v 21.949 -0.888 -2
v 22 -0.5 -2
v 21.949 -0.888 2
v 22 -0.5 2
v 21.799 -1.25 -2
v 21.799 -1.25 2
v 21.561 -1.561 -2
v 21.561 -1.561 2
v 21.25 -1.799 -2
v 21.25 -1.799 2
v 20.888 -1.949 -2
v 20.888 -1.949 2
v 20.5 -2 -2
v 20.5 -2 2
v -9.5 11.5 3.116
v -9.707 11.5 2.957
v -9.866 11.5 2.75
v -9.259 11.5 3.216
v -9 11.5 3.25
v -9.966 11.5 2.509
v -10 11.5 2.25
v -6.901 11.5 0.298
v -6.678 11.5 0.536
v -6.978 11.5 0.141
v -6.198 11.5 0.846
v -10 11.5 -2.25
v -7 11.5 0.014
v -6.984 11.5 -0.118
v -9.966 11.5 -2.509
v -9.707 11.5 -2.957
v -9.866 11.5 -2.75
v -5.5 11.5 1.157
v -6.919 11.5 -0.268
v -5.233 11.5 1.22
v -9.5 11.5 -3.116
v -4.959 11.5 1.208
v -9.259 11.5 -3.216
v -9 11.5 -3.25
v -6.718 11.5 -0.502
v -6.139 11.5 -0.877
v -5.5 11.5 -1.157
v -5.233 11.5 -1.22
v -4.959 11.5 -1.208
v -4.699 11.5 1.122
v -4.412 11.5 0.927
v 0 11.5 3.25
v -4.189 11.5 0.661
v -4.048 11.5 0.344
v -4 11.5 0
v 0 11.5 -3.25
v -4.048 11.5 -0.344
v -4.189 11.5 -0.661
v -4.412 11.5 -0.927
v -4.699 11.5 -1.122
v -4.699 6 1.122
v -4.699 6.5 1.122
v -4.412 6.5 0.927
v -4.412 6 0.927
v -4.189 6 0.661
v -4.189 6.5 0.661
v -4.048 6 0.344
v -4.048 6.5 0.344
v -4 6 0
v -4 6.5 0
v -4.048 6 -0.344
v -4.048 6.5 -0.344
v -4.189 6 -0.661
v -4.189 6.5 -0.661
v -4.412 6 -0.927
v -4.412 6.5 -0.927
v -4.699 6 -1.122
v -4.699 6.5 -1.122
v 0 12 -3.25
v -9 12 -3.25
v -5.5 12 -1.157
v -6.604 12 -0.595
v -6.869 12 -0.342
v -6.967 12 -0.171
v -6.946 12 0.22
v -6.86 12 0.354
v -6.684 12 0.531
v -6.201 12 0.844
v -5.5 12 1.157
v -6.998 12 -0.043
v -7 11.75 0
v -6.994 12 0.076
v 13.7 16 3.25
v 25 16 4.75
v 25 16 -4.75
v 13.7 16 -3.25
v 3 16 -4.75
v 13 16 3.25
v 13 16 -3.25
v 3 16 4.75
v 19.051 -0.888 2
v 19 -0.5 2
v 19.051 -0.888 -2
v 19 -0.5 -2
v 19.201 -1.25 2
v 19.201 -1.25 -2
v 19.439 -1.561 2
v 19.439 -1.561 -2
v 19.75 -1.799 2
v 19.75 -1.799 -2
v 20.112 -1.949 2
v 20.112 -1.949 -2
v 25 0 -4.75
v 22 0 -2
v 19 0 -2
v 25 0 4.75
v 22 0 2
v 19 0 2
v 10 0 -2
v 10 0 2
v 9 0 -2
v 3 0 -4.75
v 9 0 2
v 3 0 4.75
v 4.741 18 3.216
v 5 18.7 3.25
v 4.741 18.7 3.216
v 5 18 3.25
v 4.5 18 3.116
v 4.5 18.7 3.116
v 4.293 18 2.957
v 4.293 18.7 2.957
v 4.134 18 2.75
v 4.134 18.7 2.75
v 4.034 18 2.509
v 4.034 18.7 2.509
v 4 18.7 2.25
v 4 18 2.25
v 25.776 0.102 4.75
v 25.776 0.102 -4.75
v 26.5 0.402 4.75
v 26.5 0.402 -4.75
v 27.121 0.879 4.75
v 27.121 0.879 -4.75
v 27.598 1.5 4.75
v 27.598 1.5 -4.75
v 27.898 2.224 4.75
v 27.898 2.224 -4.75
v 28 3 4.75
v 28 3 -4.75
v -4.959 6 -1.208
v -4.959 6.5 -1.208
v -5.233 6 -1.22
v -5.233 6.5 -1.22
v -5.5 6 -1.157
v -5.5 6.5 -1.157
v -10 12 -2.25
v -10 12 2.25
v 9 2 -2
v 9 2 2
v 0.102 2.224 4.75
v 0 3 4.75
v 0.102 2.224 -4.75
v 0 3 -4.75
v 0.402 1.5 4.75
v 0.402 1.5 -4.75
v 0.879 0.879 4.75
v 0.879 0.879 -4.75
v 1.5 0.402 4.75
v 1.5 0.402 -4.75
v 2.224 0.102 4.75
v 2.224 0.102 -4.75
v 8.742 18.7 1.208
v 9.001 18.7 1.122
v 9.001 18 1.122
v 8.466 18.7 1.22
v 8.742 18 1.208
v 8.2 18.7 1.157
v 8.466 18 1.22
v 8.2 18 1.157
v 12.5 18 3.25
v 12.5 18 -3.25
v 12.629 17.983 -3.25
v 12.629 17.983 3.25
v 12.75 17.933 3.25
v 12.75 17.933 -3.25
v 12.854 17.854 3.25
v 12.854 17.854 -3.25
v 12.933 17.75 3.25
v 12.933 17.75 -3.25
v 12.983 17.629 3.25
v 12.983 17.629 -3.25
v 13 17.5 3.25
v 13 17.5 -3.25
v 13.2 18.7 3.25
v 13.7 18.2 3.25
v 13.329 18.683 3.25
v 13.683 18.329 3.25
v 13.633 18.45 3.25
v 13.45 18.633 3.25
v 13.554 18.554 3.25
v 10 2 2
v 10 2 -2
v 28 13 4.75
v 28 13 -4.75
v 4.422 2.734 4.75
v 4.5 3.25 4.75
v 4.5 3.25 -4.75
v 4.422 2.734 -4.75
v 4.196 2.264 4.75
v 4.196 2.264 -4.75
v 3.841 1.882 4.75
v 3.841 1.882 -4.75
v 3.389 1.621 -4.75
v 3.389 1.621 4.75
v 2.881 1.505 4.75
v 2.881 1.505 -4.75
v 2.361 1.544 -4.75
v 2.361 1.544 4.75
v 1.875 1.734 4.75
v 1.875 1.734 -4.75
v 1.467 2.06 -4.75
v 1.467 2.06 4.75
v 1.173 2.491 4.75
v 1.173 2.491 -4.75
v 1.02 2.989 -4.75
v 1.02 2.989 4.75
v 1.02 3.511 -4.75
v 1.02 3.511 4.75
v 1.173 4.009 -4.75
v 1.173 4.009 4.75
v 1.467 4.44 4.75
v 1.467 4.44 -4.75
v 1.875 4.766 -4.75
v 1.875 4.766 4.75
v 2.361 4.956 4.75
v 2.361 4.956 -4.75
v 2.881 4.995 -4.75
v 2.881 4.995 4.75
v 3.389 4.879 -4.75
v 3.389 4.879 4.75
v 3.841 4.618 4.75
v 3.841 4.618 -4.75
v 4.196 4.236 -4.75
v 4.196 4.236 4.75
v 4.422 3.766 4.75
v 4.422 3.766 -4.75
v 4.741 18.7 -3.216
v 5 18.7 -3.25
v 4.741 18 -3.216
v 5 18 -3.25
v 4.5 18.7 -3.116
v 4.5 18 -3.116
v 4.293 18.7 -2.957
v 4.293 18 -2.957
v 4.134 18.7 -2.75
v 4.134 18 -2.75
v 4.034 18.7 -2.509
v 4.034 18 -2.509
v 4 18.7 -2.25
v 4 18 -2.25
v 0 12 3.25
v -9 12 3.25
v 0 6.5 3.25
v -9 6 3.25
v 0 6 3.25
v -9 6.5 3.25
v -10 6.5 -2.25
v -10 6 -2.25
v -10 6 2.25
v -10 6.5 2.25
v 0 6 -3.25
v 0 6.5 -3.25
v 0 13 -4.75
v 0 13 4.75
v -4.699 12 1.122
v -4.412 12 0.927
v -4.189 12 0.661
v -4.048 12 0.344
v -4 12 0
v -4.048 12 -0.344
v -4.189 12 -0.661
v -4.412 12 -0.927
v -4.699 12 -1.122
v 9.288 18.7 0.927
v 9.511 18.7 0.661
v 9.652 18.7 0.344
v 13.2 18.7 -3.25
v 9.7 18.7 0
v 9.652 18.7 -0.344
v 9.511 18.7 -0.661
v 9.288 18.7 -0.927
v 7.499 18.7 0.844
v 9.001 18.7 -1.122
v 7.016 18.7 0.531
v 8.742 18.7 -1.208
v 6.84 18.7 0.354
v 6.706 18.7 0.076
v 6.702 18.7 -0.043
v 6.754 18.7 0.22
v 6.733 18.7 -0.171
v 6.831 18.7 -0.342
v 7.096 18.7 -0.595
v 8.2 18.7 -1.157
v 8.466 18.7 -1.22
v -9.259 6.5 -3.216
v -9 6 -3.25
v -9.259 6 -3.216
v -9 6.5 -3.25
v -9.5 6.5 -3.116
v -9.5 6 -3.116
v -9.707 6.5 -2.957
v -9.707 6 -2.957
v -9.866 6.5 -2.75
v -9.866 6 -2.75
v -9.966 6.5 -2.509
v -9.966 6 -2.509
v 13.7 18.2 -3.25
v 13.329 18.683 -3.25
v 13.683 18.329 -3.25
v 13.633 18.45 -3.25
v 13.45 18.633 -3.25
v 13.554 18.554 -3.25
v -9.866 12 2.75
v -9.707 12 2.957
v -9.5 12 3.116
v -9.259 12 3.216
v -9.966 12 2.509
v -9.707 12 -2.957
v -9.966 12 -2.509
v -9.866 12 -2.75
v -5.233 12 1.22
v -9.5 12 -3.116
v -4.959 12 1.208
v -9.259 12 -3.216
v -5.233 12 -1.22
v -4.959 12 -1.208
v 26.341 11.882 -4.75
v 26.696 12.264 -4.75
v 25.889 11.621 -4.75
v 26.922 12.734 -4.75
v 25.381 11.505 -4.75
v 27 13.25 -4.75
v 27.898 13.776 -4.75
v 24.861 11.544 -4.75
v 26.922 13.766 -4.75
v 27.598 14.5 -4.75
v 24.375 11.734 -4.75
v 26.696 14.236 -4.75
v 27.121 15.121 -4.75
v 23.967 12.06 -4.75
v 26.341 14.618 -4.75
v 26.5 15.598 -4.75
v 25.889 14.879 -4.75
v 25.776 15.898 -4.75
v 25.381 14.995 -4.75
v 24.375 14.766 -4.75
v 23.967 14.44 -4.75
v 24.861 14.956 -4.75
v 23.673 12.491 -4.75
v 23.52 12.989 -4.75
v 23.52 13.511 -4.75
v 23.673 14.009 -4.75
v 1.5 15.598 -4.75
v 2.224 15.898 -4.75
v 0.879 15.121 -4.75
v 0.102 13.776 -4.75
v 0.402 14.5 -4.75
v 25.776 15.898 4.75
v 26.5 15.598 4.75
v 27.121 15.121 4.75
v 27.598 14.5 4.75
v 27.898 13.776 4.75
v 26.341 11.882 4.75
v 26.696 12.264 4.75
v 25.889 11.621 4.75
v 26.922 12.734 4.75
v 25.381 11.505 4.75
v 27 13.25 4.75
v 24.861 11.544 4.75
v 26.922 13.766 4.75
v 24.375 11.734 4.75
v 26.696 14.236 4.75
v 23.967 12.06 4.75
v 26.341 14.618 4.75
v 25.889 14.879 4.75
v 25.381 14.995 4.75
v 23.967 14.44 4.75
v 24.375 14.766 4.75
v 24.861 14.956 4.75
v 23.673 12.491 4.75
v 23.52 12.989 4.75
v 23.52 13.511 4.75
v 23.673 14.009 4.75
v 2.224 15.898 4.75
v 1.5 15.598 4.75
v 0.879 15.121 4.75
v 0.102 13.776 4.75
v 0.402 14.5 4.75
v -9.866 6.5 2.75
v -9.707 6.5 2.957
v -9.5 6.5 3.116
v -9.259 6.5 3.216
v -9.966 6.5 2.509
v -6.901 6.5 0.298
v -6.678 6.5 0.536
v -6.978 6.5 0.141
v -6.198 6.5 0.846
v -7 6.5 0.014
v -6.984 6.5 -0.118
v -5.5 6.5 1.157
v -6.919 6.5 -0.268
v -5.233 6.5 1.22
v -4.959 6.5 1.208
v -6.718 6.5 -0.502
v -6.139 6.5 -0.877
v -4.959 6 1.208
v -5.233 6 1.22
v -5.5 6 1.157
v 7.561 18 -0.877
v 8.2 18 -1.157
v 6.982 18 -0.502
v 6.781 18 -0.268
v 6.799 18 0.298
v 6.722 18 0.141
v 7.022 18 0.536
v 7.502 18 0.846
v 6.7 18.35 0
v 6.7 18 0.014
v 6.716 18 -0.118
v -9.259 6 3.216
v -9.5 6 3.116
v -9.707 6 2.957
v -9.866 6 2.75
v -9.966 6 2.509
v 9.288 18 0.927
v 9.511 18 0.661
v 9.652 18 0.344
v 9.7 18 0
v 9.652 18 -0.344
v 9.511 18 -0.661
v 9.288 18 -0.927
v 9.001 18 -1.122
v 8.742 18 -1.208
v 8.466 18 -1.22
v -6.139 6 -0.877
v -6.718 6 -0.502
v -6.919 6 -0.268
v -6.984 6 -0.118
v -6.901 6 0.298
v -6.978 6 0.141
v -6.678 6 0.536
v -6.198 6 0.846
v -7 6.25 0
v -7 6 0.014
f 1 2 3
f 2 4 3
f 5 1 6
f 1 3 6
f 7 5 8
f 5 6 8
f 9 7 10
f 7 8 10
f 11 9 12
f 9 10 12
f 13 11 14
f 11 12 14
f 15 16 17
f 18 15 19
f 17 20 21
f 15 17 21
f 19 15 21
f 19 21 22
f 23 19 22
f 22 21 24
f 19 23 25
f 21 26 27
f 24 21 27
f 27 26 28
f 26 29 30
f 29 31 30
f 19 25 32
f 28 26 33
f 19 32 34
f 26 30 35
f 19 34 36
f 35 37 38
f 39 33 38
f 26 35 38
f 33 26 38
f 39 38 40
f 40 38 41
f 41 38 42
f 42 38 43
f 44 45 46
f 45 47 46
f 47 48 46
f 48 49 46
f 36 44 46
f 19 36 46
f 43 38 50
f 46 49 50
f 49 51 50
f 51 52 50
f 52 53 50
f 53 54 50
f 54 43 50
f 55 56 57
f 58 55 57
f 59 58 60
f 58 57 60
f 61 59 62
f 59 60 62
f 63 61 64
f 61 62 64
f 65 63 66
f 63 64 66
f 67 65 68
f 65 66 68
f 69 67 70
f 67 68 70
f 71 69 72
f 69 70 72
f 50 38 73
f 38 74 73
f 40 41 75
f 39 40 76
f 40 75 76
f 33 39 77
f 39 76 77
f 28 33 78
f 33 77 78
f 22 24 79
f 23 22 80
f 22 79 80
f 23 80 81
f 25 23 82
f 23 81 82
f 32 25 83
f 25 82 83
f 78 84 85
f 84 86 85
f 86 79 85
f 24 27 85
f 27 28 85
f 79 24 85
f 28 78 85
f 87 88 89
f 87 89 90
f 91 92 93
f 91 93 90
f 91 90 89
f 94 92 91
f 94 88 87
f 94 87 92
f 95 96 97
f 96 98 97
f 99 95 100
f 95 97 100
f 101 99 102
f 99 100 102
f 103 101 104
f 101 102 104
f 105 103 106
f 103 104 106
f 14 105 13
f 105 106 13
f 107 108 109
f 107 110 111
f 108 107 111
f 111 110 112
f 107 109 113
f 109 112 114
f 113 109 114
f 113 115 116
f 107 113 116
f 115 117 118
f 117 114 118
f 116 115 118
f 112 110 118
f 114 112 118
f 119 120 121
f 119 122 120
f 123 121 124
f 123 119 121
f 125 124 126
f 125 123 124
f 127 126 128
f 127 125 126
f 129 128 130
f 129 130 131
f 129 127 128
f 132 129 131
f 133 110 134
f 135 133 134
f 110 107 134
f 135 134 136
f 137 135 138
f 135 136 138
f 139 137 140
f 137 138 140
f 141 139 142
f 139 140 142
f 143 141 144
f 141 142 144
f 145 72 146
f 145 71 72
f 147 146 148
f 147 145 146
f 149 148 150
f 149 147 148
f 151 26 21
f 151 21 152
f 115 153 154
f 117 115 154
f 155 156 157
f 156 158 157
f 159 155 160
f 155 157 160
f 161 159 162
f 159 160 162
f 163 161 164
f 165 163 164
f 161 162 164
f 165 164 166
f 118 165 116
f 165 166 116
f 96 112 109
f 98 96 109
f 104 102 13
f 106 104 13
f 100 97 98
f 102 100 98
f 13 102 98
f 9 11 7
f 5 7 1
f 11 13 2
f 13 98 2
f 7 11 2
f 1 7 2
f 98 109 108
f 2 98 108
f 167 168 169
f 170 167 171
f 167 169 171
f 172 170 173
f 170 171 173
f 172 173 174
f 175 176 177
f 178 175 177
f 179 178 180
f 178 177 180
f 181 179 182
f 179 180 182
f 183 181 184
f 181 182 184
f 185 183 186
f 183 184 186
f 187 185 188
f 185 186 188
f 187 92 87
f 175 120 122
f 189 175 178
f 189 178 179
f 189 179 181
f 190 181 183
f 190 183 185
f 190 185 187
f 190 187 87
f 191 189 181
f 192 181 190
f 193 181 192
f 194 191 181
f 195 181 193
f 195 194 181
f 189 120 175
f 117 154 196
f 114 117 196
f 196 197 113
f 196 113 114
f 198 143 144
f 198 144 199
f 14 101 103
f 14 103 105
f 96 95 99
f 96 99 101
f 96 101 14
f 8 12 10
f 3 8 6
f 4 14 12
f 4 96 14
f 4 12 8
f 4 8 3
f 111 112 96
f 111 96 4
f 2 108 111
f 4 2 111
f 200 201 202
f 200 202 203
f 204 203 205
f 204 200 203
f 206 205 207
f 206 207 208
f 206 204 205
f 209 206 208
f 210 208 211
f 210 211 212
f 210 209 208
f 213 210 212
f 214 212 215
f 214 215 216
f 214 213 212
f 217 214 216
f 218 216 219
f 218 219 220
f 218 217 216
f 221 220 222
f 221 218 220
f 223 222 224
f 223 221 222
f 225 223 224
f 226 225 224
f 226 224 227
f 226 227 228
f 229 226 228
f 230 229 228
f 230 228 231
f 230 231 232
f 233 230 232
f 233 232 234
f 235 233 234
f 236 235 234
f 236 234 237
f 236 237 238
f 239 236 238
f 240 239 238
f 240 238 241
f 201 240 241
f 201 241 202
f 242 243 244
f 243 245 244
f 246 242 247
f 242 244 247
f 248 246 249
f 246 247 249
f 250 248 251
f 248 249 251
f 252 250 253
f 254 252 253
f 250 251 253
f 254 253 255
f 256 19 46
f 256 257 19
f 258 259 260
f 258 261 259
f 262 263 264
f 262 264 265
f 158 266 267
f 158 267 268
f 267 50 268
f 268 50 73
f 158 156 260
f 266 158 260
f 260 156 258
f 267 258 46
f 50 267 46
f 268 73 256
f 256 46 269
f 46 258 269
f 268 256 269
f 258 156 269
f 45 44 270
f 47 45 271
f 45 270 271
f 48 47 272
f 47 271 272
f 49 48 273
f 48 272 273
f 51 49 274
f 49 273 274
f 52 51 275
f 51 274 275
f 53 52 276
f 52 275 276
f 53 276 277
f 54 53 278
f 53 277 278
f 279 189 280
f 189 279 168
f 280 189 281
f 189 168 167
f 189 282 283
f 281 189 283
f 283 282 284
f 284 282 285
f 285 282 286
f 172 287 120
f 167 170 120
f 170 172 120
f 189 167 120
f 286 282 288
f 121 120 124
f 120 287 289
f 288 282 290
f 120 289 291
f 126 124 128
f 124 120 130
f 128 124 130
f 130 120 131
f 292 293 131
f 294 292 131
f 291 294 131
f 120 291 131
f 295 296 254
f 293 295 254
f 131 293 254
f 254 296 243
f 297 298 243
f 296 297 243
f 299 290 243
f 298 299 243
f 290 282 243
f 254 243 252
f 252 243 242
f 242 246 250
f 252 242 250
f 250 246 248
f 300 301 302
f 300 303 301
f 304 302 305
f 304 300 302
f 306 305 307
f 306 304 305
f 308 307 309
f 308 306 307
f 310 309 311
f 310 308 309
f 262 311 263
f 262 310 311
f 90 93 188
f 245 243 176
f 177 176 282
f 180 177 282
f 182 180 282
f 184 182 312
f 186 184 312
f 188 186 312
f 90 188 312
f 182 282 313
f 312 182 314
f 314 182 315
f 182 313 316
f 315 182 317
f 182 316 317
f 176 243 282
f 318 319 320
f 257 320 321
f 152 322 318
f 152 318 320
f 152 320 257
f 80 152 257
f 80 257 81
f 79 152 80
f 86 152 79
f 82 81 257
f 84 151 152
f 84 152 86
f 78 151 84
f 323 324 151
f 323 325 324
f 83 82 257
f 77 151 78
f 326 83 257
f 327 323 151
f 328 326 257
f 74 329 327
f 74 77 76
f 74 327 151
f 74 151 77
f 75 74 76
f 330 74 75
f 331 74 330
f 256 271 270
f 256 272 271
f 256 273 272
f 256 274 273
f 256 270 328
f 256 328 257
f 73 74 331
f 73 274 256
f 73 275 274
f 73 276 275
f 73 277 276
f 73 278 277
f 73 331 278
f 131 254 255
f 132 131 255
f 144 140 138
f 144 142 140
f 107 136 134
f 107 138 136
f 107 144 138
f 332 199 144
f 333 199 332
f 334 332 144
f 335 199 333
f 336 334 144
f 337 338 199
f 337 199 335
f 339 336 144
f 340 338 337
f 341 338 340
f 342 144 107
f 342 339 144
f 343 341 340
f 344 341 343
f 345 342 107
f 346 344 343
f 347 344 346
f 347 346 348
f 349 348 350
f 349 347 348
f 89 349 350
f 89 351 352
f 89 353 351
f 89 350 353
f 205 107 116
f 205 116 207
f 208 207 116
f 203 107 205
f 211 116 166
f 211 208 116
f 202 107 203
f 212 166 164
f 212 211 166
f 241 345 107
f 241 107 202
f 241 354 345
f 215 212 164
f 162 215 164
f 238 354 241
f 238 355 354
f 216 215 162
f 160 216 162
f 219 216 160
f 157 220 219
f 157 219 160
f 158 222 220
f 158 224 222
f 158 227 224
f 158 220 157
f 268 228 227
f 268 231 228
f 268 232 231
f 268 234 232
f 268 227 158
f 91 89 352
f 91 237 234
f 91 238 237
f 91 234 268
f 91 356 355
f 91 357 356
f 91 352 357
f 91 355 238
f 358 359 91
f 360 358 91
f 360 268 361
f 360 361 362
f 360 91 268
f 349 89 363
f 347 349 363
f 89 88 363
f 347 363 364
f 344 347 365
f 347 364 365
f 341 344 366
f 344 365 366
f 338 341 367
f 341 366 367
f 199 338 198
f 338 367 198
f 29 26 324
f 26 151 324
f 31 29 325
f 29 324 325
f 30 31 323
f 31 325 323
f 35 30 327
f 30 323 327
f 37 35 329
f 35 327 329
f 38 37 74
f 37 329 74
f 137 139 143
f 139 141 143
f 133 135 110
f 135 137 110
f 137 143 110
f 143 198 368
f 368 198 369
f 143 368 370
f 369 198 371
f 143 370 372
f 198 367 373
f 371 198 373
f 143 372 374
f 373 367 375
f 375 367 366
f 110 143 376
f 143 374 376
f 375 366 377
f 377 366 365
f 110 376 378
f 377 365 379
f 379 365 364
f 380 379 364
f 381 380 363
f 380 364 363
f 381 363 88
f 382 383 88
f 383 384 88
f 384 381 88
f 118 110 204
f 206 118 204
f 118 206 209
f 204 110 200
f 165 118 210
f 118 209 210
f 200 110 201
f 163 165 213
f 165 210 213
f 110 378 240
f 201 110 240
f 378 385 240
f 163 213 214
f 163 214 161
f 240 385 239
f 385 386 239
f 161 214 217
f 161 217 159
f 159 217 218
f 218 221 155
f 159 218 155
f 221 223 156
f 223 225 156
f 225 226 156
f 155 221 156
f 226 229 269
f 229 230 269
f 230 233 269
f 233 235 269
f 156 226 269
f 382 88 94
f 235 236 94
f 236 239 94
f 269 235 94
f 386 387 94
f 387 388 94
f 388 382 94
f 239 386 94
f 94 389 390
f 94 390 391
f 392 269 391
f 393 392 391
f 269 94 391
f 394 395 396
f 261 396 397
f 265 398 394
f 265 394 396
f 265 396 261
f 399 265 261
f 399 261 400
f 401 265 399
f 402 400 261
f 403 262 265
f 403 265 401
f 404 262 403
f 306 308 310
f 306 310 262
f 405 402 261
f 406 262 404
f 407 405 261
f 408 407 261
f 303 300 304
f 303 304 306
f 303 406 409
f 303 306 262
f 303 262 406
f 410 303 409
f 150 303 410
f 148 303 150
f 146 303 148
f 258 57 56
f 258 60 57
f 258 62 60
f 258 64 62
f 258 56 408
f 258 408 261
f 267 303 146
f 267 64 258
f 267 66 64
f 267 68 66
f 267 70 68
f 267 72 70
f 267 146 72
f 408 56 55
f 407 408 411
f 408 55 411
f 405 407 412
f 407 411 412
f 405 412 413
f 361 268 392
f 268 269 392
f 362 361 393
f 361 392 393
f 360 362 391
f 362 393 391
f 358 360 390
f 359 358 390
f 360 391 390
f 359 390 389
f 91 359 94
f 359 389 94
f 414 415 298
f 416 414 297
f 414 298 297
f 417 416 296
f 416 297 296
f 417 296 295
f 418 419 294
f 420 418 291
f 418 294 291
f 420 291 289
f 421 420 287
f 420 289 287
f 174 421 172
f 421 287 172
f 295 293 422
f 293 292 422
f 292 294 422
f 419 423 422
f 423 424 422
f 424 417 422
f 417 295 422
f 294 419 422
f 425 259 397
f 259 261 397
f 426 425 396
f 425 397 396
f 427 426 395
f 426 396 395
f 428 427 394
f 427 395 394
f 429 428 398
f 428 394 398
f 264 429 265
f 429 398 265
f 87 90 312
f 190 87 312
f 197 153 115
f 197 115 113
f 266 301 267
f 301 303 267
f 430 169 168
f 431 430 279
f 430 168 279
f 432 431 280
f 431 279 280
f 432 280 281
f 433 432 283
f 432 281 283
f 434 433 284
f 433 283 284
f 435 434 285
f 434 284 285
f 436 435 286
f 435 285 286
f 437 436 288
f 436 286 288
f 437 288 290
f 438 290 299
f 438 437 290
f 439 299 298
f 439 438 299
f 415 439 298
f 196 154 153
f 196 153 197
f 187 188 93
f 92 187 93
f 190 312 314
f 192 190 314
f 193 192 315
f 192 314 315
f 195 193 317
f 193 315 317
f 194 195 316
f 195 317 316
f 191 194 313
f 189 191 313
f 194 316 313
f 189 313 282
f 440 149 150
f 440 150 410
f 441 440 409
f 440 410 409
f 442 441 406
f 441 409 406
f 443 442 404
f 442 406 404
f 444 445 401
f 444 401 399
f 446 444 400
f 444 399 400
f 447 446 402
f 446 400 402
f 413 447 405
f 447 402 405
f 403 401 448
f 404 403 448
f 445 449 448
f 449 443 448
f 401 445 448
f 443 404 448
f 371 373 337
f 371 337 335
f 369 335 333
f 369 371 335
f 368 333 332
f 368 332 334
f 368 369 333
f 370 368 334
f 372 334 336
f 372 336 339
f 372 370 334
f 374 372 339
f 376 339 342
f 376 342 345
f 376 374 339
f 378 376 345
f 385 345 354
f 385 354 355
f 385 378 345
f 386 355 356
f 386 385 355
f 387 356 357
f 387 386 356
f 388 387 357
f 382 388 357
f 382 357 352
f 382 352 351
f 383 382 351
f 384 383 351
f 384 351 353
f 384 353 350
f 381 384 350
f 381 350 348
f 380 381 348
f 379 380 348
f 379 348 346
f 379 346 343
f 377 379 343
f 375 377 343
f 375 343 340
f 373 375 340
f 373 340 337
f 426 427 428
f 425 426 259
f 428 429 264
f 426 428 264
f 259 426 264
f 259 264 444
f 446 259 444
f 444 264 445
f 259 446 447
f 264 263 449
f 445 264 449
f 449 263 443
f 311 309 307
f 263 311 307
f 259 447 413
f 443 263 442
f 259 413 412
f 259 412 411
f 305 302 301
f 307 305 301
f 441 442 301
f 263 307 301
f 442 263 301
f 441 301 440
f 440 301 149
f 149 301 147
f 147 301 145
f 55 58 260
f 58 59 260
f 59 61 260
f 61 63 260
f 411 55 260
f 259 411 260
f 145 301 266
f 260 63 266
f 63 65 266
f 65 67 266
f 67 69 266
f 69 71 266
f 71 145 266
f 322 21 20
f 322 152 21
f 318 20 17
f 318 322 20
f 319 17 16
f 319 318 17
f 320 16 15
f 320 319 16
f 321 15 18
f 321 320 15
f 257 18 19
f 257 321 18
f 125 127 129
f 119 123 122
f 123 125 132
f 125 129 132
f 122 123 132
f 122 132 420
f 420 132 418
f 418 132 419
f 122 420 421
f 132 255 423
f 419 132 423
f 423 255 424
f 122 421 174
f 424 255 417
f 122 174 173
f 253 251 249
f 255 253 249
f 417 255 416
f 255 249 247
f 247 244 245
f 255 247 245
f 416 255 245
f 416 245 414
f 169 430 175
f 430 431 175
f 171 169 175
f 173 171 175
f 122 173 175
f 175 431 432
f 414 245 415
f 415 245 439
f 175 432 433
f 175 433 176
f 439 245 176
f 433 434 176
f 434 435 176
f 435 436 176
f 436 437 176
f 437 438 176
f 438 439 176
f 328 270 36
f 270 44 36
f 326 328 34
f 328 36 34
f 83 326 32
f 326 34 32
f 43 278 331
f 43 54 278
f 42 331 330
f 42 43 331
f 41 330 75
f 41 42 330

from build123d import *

# Parameters (mm, degrees)
BOSS_EXTRUDE1_DEPTH      = 3.25
BOSS_EXTRUDE1_DEPTH_BACK = 3.25
SKETCH1_W                = 10
SKETCH1_H                = 0.5
SKETCH1_W_2              = 28
SKETCH1_H_2              = 16
SKETCH1_R                = 1.75
BOSS_EXTRUDE2_DEPTH      = 1.5
BOSS_EXTRUDE2_DEPTH_BACK = 8
SKETCH2_W                = 28
SKETCH2_H                = 16
SKETCH2_R                = 1.75
CUT_EXTRUDE1_DEPTH       = 9.5
CUT_EXTRUDE2_DEPTH       = 1.5
FILLET1_R                = 1
FILLET2_R                = 1
FILLET3_R                = 3
SKETCH5_W                = 3
SKETCH5_H                = 2
BOSS_EXTRUDE3_DEPTH      = 2
FILLET4_R                = 1.5
CUT_EXTRUDE3_DEPTH       = 35.003713088
CUT_EXTRUDE3_DEPTH_BACK  = 2
SKETCH6_W                = 1
SKETCH6_H                = 4


with BuildPart() as part:
    # Sketch1 → Boss-Extrude1 (new, two sides: drawn at the far end of the back side and taken through both)
    # profile 1 of 4: a face of its own
    with BuildSketch(Plane.XY.offset(-BOSS_EXTRUDE1_DEPTH_BACK)):
        with Locations((-5, 6.25)):
            Rectangle(SKETCH1_W, SKETCH1_H)
    # profile 2 of 4: a face of its own
    with BuildSketch(Plane.XY.offset(-BOSS_EXTRUDE1_DEPTH_BACK)):
        with Locations((-5, 11.75)):
            Rectangle(SKETCH1_W, SKETCH1_H)
    # profile 3 of 4: a face of its own
    with BuildSketch(Plane.XY.offset(-BOSS_EXTRUDE1_DEPTH_BACK)):
        with Locations((14, 8)):
            Rectangle(SKETCH1_W_2, SKETCH1_H_2)
        with Locations((2.75, 3.25)):
            Circle(SKETCH1_R, mode=Mode.SUBTRACT)
        with Locations((25.25, 13.25)):
            Circle(SKETCH1_R, mode=Mode.SUBTRACT)
    # profile 4 of 4: a face of its own
    with BuildSketch(Plane.XY.offset(-BOSS_EXTRUDE1_DEPTH_BACK)):
        with BuildLine():
            Line((13, 16), (13.7, 16))
            Line((13.7, 16), (13.7, 18.2))
            ThreePointArc((13.7, 18.2), (13.553553391, 18.553553391), (13.2, 18.7))
            Line((13.2, 18.7), (4, 18.7))
            Line((4, 18.7), (4, 18))
            Line((4, 18), (12.5, 18))
            ThreePointArc((12.5, 18), (12.853553391, 17.853553391), (13, 17.5))
            Line((13, 17.5), (13, 16))
        make_face()
    extrude(amount=BOSS_EXTRUDE1_DEPTH + BOSS_EXTRUDE1_DEPTH_BACK)

    # Sketch2 → Boss-Extrude2 (add, two sides: drawn at the far end of the back side and taken through both)
    with BuildSketch(Plane(origin=(0, 0, -3.25), x_dir=(-1, 0, 0), z_dir=(0, 0, -1)).offset(-BOSS_EXTRUDE2_DEPTH_BACK)):
        with Locations((-14, 8)):
            Rectangle(SKETCH2_W, SKETCH2_H)
        with Locations(Location((-25.25, 13.25, 0), (0, 0, 180))):
            Circle(SKETCH2_R, mode=Mode.SUBTRACT)
        with Locations(Location((-2.75, 3.25, 0), (0, 0, 180))):
            Circle(SKETCH2_R, mode=Mode.SUBTRACT)
    extrude(amount=BOSS_EXTRUDE2_DEPTH + BOSS_EXTRUDE2_DEPTH_BACK)

    # Sketch3 → Cut-Extrude1 (cut)
    with BuildSketch(Plane(origin=(0, 12, 0), x_dir=(1, 0, 0), z_dir=(0, 1, 0))):
        with BuildLine():
            ThreePointArc((-5.25, -1.25), (-4, 0), (-5.25, 1.25))
            add(Edge.make_bspline(
                [(-5.25, 1.25), (-8.75, 0), (-5.25, -1.25)],
                knots=[0.849927106, 0.849927106, 0.849927106, 1.849927106, 1.849927106, 1.849927106], degree=2))
        make_face()
    extrude(amount=-CUT_EXTRUDE1_DEPTH, mode=Mode.SUBTRACT)

    # Sketch4 → Cut-Extrude2 (cut)
    with BuildSketch(Plane(origin=(0, 18.7, 0), x_dir=(1, 0, 0), z_dir=(0, 1, 0))):
        with BuildLine():
            ThreePointArc((8.45, -1.25), (9.7, 0), (8.45, 1.25))
            add(Edge.make_bspline(
                [(8.45, 1.25), (4.95, 0), (8.45, -1.25)],
                knots=[0.849927106, 0.849927106, 0.849927106, 1.849927106, 1.849927106, 1.849927106], degree=2))
        make_face()
    extrude(amount=-CUT_EXTRUDE2_DEPTH, mode=Mode.SUBTRACT)

    # Fillet1
    fillet1_edges = [part.edges().sort_by_distance(p)[0] for p in [
        (-5.25, 6.25, 1.25),
        (-5.25, 6.25, -1.25),
        (-5.25, 11.75, 1.25),
        (-5.25, 11.75, -1.25),
        (8.45, 18.35, -1.25),
        (8.45, 18.35, 1.25),
    ]]
    fillet(fillet1_edges, radius=FILLET1_R)

    # Fillet2
    fillet2_edges = [part.edges().sort_by_distance(p)[0] for p in [
        (-10, 6.25, -3.25),
        (4, 18.35, -3.25),
        (-10, 6.25, 3.25),
        (-10, 11.75, 3.25),
        (4, 18.35, 3.25),
        (-10, 11.75, -3.25),
    ]]
    fillet(fillet2_edges, radius=FILLET2_R)

    # Fillet3
    fillet3_edges = [part.edges().sort_by_distance(p)[0] for p in [
        (0, 16, 0),
        (28, 16, 0),
        (28, 0, 0),
        (0, 0, 0),
    ]]
    fillet(fillet3_edges, radius=FILLET3_R)

    # Sketch5 → Boss-Extrude3 (add)
    with BuildSketch(Plane.XZ):
        with Locations((20.5, -1)):
            Rectangle(SKETCH5_W, SKETCH5_H)
        with Locations((20.5, 1)):
            Rectangle(SKETCH5_W, SKETCH5_H)
    extrude(amount=BOSS_EXTRUDE3_DEPTH)

    # Fillet4
    fillet4_edges = [part.edges().sort_by_distance(p)[0] for p in [
        (19, -2, 0),
        (22, -2, 0),
    ]]
    fillet(fillet4_edges, radius=FILLET4_R - 0.0001)  # a hair under: the kernel refuses the full size

    # Sketch6 → Cut-Extrude3 (cut, two sides: drawn at the far end of the back side and taken through both)
    with BuildSketch(Plane.XZ.offset(-CUT_EXTRUDE3_DEPTH_BACK)):
        with Locations((9.5, 0)):
            Rectangle(SKETCH6_W, SKETCH6_H)
    extrude(amount=CUT_EXTRUDE3_DEPTH + CUT_EXTRUDE3_DEPTH_BACK, mode=Mode.SUBTRACT)


solid = part.part
